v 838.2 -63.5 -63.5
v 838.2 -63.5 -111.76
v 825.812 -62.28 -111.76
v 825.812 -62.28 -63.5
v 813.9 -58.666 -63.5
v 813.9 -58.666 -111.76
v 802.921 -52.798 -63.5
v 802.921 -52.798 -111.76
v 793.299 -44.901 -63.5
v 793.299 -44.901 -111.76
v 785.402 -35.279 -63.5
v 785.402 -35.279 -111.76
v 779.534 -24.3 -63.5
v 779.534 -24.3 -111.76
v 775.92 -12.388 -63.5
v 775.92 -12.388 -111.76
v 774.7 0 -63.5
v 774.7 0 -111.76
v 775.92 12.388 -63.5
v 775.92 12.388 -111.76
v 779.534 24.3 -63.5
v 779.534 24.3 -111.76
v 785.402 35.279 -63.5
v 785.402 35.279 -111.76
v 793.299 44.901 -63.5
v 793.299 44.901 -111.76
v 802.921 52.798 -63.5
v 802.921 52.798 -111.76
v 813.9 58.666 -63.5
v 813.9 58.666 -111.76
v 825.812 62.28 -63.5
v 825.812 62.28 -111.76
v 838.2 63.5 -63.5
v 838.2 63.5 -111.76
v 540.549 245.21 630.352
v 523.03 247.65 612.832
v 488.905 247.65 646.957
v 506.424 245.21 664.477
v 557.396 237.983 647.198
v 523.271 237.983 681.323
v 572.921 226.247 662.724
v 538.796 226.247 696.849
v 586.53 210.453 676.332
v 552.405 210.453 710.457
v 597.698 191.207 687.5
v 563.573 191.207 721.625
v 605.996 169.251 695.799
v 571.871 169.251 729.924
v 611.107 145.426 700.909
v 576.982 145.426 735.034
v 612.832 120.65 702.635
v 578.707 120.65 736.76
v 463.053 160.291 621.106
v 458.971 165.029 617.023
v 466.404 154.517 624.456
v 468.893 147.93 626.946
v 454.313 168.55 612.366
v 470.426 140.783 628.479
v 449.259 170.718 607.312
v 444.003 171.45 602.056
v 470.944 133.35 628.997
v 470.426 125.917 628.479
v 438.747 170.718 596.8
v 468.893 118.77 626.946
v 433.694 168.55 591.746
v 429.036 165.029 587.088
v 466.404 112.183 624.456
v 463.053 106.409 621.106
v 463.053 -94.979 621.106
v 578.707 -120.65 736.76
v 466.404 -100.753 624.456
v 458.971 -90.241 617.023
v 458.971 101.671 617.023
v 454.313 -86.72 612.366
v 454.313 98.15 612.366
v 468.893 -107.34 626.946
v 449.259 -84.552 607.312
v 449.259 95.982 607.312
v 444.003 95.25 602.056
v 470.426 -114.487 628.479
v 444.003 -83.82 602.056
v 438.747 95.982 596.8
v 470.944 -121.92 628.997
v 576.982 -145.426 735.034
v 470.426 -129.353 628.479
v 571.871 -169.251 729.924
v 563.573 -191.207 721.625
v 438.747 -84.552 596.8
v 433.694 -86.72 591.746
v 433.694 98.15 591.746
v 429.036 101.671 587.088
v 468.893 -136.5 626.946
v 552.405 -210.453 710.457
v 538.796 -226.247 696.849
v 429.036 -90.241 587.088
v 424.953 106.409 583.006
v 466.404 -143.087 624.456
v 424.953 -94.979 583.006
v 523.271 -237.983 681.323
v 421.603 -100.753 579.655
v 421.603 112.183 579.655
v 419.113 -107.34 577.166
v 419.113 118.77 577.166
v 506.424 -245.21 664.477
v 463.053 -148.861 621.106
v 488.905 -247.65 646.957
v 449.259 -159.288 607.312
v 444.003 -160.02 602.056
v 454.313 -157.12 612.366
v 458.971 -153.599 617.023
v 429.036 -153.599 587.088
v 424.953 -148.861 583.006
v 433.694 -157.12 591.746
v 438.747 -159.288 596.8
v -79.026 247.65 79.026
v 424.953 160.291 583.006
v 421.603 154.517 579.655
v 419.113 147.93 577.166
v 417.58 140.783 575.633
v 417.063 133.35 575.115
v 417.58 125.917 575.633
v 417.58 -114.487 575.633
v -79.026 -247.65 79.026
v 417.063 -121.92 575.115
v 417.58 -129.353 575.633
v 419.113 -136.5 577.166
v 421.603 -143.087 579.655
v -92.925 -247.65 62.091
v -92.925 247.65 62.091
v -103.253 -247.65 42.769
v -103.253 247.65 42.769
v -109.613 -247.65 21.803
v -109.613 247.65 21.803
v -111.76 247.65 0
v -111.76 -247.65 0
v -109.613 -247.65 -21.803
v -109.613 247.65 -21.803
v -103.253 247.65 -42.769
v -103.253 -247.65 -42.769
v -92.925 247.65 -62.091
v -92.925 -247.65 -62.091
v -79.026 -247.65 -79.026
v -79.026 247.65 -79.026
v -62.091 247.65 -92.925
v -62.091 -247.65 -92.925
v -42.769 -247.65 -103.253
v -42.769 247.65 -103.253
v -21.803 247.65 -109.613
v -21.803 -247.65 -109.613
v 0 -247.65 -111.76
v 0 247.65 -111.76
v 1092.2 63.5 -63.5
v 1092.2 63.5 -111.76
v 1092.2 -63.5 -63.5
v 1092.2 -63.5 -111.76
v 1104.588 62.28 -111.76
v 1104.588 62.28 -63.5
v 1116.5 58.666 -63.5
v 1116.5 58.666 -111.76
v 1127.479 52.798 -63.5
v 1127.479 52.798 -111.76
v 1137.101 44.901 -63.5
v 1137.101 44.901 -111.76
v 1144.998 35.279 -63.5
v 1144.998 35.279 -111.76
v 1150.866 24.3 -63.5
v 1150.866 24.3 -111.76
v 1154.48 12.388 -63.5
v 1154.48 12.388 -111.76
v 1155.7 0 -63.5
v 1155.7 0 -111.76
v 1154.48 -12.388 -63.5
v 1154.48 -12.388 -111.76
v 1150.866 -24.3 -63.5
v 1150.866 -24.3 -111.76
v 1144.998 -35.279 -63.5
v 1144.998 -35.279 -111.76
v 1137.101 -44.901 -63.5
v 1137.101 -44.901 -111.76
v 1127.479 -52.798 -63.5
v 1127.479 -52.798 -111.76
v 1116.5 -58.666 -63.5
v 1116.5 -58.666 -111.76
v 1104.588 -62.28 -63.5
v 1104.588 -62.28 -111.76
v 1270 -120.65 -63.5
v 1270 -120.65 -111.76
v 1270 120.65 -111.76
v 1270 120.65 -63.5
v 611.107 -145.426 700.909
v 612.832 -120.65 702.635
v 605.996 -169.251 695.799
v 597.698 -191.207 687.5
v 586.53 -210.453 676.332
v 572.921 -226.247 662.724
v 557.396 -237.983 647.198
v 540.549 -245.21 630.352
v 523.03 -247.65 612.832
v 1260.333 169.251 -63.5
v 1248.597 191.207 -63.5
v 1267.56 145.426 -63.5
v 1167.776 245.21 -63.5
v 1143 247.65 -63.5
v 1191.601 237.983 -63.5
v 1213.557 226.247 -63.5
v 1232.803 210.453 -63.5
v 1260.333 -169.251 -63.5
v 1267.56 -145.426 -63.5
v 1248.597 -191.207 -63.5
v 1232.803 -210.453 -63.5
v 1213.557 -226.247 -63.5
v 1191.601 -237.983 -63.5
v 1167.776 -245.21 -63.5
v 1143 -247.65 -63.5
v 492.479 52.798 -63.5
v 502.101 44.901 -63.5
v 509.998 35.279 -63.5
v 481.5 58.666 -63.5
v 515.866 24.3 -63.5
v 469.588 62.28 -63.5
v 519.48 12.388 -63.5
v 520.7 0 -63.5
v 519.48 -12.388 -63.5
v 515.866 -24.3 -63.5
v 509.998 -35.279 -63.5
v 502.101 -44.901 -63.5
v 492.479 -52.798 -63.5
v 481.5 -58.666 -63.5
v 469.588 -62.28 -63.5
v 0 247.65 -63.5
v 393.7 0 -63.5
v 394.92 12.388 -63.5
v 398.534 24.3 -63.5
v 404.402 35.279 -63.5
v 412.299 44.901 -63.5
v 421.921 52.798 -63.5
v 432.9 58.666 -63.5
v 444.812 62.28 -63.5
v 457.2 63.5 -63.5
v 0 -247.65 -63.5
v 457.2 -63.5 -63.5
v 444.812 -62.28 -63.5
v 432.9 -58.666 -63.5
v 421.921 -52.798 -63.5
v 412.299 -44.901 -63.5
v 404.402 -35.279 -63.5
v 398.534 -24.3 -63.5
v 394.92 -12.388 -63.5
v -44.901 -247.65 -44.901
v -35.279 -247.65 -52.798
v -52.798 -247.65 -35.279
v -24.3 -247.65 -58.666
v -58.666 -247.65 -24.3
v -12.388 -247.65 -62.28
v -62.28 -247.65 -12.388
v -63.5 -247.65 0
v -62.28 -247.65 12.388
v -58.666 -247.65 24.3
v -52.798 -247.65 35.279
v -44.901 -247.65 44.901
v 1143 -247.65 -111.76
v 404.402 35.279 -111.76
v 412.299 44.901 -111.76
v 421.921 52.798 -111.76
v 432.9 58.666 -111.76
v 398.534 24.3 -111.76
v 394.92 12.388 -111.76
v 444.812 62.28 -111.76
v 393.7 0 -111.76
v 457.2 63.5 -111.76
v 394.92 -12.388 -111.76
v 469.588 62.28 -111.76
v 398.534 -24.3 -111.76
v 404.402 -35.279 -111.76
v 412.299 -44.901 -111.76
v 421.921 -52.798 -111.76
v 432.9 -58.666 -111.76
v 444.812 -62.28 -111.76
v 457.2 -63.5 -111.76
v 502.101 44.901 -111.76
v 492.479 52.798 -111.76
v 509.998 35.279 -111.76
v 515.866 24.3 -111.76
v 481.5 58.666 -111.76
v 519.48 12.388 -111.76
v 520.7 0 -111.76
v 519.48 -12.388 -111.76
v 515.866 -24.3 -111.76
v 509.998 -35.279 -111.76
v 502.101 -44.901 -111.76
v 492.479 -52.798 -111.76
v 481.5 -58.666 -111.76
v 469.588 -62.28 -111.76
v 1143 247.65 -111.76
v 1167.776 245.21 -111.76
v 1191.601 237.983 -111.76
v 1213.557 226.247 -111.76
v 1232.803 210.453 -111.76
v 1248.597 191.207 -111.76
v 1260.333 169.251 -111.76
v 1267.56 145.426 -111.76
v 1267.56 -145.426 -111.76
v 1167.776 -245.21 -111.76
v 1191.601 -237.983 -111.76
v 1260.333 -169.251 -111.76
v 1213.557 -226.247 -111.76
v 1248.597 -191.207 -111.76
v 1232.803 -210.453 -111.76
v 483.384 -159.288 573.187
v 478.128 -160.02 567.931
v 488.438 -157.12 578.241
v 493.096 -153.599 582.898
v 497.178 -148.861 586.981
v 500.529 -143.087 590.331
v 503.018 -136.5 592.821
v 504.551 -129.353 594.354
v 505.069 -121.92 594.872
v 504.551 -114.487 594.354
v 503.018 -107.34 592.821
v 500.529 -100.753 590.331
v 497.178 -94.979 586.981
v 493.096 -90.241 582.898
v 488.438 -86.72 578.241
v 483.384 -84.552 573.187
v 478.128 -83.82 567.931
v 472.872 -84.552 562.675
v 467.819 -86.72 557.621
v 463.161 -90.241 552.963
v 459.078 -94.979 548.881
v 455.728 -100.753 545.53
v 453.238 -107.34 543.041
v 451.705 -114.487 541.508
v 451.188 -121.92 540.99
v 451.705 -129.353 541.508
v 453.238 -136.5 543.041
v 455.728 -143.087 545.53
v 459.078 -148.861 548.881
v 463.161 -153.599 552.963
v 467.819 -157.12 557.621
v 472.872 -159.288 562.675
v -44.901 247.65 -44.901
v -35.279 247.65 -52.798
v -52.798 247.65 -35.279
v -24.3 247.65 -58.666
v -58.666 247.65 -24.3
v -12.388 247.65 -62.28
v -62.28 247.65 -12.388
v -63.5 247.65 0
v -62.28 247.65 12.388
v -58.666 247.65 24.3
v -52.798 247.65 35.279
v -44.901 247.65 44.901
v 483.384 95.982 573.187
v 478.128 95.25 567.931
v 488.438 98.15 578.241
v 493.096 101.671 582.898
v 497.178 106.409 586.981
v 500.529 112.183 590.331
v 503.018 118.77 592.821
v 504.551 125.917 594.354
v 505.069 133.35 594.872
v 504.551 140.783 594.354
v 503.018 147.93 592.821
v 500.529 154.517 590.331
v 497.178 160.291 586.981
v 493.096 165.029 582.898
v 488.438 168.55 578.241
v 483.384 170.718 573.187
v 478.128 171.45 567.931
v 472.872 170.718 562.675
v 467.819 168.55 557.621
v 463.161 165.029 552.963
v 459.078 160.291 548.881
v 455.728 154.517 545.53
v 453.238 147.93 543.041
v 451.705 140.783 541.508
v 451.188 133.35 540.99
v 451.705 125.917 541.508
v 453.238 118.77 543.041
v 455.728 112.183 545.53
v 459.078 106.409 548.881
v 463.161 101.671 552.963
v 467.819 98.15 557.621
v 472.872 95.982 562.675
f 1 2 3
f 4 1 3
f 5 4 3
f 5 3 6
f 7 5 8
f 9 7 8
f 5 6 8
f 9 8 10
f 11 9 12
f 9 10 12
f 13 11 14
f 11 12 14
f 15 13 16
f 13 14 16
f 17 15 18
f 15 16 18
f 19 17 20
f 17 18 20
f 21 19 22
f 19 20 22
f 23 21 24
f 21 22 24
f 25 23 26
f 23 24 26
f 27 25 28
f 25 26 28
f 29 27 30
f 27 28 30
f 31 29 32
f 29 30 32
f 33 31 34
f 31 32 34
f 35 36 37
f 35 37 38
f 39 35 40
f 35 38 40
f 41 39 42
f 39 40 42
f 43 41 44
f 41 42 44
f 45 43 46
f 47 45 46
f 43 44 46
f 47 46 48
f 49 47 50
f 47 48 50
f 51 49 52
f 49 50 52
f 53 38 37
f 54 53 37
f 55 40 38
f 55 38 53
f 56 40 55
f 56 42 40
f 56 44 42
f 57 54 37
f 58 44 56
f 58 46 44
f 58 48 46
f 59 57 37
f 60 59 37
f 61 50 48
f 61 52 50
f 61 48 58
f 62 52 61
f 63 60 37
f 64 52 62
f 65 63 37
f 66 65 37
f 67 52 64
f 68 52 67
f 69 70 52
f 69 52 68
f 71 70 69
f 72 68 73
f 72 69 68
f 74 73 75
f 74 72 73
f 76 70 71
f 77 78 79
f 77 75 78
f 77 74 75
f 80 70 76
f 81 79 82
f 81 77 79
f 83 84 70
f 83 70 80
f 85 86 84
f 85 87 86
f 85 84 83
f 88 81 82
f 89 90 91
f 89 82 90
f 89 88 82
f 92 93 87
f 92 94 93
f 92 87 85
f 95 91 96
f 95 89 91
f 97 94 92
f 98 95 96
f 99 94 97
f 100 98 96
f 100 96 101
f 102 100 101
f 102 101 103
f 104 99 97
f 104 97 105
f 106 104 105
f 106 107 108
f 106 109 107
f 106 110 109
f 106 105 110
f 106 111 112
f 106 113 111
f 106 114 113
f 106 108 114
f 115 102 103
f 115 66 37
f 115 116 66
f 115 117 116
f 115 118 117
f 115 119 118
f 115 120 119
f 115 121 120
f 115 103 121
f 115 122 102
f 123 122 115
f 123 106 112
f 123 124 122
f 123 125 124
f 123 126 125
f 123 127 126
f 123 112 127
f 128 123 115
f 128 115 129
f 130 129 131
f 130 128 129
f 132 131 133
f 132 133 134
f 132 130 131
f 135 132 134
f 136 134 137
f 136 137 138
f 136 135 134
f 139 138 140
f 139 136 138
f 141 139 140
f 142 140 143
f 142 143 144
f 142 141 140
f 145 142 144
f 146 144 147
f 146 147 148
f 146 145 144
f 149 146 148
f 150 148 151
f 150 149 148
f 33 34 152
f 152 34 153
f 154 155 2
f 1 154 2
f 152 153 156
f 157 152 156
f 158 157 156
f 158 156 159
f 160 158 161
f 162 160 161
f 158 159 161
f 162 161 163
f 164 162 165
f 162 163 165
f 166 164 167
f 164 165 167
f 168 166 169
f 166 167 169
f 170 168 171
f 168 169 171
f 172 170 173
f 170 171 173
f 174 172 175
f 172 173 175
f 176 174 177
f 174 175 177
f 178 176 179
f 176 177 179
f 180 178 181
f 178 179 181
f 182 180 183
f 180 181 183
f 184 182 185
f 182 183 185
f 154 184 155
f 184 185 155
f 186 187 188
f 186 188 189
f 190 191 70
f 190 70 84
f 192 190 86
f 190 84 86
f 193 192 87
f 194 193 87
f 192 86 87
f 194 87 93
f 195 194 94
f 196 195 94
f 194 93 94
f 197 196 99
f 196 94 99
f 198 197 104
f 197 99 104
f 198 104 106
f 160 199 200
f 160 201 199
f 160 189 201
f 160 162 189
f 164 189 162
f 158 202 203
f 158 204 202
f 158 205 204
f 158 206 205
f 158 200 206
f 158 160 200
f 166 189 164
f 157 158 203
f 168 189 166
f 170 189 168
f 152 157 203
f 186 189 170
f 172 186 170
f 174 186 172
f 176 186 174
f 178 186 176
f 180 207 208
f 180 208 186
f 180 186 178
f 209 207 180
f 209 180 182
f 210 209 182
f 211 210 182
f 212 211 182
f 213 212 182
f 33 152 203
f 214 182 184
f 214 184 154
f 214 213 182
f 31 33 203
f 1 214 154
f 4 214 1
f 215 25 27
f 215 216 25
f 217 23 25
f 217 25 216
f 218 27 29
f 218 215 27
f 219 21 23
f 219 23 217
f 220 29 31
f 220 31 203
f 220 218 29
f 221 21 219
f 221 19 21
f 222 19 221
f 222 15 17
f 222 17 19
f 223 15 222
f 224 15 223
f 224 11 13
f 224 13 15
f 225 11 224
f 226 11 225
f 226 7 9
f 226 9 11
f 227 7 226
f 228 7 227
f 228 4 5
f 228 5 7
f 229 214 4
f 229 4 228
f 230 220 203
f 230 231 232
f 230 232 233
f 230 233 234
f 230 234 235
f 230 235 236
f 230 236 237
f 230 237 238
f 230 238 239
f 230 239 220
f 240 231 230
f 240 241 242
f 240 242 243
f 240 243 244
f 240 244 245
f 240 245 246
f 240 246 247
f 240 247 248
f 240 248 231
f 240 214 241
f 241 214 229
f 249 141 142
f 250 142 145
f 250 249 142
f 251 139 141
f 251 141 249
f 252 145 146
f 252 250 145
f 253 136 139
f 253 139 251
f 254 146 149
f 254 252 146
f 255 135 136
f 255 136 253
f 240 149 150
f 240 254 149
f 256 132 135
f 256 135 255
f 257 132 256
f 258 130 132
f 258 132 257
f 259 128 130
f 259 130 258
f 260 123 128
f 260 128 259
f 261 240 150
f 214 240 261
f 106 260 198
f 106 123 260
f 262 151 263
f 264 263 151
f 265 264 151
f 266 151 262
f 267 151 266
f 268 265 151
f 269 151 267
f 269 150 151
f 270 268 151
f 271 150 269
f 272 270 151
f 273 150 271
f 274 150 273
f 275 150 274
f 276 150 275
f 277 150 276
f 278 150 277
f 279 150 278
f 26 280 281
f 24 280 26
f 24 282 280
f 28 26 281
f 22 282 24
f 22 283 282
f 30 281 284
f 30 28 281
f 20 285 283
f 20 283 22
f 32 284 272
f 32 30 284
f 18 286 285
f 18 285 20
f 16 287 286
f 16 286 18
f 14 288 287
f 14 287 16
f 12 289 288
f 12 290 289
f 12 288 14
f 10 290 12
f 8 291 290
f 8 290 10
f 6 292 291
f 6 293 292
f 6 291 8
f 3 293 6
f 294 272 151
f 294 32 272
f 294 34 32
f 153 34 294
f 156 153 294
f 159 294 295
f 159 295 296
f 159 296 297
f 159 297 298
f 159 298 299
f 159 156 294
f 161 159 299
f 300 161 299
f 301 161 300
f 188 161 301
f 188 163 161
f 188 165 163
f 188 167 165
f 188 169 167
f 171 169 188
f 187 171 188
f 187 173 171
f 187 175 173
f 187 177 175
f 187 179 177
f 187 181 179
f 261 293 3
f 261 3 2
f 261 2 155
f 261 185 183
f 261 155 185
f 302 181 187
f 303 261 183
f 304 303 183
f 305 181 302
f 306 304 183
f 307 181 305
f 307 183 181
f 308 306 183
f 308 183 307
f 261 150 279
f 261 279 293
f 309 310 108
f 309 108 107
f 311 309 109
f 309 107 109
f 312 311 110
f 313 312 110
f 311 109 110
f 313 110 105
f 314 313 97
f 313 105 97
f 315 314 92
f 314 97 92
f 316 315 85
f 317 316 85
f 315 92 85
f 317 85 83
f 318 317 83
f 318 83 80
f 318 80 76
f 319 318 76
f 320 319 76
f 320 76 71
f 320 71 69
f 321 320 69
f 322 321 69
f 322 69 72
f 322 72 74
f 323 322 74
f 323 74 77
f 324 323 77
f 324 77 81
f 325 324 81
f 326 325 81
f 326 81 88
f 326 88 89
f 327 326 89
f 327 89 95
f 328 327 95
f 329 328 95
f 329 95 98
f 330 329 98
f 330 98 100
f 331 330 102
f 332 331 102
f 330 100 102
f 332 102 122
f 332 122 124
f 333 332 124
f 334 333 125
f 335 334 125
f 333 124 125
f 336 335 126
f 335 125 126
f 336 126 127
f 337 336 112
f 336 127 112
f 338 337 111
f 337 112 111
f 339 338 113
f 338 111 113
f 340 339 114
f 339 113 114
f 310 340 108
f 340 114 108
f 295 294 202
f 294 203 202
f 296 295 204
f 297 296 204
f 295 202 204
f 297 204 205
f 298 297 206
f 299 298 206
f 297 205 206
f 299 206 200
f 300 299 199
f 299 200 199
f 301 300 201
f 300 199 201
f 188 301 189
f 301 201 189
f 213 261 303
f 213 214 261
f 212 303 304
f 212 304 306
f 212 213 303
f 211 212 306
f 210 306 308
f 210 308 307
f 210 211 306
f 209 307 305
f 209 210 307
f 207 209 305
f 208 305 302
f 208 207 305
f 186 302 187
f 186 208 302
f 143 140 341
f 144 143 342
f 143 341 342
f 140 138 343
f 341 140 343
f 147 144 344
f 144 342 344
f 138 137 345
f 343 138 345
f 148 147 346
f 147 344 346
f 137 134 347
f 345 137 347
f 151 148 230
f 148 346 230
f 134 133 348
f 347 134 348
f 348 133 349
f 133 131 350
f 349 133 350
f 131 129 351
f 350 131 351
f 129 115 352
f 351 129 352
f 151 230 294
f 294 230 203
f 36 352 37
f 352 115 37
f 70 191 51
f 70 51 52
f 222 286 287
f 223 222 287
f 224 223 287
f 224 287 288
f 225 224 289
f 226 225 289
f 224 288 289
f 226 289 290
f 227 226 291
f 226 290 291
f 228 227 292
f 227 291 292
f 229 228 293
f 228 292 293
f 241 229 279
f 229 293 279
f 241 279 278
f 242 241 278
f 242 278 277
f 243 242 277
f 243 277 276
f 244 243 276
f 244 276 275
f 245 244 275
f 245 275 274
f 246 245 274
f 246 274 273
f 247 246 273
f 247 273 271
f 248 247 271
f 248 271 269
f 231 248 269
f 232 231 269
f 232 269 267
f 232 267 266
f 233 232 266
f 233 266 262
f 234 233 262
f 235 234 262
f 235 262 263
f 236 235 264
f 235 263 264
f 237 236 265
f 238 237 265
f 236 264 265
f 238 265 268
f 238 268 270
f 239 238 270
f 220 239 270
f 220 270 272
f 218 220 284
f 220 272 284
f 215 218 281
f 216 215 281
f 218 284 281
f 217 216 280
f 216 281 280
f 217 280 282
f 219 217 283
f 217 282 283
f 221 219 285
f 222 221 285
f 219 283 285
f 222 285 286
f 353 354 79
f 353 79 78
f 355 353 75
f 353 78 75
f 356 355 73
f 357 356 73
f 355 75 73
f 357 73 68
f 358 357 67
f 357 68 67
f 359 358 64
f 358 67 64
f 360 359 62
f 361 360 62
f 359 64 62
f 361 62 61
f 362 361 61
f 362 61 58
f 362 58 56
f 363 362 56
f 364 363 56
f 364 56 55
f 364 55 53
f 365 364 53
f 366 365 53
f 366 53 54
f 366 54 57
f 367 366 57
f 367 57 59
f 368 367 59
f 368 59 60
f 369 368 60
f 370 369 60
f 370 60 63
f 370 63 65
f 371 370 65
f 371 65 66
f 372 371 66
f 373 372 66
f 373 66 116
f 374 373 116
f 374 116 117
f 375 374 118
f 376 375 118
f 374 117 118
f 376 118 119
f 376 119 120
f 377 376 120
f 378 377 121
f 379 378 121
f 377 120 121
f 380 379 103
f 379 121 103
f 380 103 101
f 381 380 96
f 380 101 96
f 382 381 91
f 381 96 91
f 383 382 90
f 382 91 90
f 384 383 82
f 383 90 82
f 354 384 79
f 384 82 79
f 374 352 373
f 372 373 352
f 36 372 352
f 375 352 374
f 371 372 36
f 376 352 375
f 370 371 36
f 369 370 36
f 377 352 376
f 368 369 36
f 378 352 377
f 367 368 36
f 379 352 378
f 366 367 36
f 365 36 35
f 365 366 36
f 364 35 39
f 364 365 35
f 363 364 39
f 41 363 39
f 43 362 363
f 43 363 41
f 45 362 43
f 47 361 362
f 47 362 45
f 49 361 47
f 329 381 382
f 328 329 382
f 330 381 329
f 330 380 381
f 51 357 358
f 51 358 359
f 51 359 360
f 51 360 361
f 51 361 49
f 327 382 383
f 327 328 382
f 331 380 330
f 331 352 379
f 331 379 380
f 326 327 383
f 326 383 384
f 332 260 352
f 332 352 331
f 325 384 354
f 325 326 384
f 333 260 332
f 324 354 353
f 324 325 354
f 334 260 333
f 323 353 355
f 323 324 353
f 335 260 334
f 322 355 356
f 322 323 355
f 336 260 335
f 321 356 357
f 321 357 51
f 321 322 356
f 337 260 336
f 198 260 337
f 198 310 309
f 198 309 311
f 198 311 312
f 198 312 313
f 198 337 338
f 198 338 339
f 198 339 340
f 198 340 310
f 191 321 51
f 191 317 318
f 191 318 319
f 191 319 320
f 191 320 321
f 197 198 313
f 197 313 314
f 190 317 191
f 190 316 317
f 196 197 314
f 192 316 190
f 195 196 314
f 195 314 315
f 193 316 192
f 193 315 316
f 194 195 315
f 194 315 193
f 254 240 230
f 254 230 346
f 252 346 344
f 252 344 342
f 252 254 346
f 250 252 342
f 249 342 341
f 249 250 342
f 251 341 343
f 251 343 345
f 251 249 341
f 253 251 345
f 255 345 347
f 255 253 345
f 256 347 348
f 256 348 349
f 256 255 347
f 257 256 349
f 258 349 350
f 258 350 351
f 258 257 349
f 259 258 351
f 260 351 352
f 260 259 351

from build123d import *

# Parameters (mm, degrees)
F1_DEPTH = 247.65
F2_R     = 38.1
F3_DEPTH = 50.8
F4_R     = 63.5
F5_DEPTH = 50.8
F6_R     = 127


with BuildPart() as f1:
    # F0 (on Front) → F1 (new body, symmetric)
    with BuildSketch(Plane.XZ):
        with BuildLine():
            Line((578.707208, 736.759715), (-79.026254, 79.026254))
            ThreePointArc((-79.026254, 79.026254), (-103.252777, -42.7687), (0, -111.76))
            Line((0, -111.76), (1270, -111.76))
            Line((1270, -111.76), (1270, -63.5))
            Line((1270, -63.5), (0, -63.5))
            ThreePointArc((0, -63.5), (-58.66635, -24.300398), (-44.901281, 44.901281))
            Line((-44.901281, 44.901281), (612.832181, 702.634742))
            Line((612.832181, 702.634742), (578.707208, 736.759715))
        make_face()
    extrude(amount=F1_DEPTH, both=True)

    # F2 (on face) → F3 (cut)
    with BuildSketch(Plane(origin=(-79.026254, 0, 79.026254), x_dir=(0, -1, 0), z_dir=(-0.707107, 0, 0.707107))):
        with Locations((-133.35, 739.675582)):
            Circle(F2_R)
        with Locations((121.92, 739.675582)):
            Circle(F2_R)
    extrude(amount=-F3_DEPTH, mode=Mode.SUBTRACT)

    # F4 (on face) → F5 (cut)
    with BuildSketch(Plane(origin=(0, 0, -111.76), x_dir=(1, 0, 0), z_dir=(0, 0, -1))):
        with BuildLine():
            Line((838.2, -63.5), (1092.2, -63.5))
            ThreePointArc((1092.2, -63.5), (1155.7, 0), (1092.2, 63.5))
            Line((1092.2, 63.5), (838.2, 63.5))
            ThreePointArc((838.2, 63.5), (774.7, 0), (838.2, -63.5))
        make_face()
        with Locations((457.2, 0)):
            Circle(F4_R)
    extrude(amount=-F5_DEPTH, mode=Mode.SUBTRACT)

    # F6
    f6_edges = [f1.edges().sort_by_distance(p)[0] for p in [
        (1270, -247.65, -87.63),
        (1270, 247.65, -87.63),
        (595.769694, -247.65, 719.697229),
        (595.769694, 247.65, 719.697229),
    ]]
    fillet(f6_edges, radius=F6_R)


solid = f1.part
